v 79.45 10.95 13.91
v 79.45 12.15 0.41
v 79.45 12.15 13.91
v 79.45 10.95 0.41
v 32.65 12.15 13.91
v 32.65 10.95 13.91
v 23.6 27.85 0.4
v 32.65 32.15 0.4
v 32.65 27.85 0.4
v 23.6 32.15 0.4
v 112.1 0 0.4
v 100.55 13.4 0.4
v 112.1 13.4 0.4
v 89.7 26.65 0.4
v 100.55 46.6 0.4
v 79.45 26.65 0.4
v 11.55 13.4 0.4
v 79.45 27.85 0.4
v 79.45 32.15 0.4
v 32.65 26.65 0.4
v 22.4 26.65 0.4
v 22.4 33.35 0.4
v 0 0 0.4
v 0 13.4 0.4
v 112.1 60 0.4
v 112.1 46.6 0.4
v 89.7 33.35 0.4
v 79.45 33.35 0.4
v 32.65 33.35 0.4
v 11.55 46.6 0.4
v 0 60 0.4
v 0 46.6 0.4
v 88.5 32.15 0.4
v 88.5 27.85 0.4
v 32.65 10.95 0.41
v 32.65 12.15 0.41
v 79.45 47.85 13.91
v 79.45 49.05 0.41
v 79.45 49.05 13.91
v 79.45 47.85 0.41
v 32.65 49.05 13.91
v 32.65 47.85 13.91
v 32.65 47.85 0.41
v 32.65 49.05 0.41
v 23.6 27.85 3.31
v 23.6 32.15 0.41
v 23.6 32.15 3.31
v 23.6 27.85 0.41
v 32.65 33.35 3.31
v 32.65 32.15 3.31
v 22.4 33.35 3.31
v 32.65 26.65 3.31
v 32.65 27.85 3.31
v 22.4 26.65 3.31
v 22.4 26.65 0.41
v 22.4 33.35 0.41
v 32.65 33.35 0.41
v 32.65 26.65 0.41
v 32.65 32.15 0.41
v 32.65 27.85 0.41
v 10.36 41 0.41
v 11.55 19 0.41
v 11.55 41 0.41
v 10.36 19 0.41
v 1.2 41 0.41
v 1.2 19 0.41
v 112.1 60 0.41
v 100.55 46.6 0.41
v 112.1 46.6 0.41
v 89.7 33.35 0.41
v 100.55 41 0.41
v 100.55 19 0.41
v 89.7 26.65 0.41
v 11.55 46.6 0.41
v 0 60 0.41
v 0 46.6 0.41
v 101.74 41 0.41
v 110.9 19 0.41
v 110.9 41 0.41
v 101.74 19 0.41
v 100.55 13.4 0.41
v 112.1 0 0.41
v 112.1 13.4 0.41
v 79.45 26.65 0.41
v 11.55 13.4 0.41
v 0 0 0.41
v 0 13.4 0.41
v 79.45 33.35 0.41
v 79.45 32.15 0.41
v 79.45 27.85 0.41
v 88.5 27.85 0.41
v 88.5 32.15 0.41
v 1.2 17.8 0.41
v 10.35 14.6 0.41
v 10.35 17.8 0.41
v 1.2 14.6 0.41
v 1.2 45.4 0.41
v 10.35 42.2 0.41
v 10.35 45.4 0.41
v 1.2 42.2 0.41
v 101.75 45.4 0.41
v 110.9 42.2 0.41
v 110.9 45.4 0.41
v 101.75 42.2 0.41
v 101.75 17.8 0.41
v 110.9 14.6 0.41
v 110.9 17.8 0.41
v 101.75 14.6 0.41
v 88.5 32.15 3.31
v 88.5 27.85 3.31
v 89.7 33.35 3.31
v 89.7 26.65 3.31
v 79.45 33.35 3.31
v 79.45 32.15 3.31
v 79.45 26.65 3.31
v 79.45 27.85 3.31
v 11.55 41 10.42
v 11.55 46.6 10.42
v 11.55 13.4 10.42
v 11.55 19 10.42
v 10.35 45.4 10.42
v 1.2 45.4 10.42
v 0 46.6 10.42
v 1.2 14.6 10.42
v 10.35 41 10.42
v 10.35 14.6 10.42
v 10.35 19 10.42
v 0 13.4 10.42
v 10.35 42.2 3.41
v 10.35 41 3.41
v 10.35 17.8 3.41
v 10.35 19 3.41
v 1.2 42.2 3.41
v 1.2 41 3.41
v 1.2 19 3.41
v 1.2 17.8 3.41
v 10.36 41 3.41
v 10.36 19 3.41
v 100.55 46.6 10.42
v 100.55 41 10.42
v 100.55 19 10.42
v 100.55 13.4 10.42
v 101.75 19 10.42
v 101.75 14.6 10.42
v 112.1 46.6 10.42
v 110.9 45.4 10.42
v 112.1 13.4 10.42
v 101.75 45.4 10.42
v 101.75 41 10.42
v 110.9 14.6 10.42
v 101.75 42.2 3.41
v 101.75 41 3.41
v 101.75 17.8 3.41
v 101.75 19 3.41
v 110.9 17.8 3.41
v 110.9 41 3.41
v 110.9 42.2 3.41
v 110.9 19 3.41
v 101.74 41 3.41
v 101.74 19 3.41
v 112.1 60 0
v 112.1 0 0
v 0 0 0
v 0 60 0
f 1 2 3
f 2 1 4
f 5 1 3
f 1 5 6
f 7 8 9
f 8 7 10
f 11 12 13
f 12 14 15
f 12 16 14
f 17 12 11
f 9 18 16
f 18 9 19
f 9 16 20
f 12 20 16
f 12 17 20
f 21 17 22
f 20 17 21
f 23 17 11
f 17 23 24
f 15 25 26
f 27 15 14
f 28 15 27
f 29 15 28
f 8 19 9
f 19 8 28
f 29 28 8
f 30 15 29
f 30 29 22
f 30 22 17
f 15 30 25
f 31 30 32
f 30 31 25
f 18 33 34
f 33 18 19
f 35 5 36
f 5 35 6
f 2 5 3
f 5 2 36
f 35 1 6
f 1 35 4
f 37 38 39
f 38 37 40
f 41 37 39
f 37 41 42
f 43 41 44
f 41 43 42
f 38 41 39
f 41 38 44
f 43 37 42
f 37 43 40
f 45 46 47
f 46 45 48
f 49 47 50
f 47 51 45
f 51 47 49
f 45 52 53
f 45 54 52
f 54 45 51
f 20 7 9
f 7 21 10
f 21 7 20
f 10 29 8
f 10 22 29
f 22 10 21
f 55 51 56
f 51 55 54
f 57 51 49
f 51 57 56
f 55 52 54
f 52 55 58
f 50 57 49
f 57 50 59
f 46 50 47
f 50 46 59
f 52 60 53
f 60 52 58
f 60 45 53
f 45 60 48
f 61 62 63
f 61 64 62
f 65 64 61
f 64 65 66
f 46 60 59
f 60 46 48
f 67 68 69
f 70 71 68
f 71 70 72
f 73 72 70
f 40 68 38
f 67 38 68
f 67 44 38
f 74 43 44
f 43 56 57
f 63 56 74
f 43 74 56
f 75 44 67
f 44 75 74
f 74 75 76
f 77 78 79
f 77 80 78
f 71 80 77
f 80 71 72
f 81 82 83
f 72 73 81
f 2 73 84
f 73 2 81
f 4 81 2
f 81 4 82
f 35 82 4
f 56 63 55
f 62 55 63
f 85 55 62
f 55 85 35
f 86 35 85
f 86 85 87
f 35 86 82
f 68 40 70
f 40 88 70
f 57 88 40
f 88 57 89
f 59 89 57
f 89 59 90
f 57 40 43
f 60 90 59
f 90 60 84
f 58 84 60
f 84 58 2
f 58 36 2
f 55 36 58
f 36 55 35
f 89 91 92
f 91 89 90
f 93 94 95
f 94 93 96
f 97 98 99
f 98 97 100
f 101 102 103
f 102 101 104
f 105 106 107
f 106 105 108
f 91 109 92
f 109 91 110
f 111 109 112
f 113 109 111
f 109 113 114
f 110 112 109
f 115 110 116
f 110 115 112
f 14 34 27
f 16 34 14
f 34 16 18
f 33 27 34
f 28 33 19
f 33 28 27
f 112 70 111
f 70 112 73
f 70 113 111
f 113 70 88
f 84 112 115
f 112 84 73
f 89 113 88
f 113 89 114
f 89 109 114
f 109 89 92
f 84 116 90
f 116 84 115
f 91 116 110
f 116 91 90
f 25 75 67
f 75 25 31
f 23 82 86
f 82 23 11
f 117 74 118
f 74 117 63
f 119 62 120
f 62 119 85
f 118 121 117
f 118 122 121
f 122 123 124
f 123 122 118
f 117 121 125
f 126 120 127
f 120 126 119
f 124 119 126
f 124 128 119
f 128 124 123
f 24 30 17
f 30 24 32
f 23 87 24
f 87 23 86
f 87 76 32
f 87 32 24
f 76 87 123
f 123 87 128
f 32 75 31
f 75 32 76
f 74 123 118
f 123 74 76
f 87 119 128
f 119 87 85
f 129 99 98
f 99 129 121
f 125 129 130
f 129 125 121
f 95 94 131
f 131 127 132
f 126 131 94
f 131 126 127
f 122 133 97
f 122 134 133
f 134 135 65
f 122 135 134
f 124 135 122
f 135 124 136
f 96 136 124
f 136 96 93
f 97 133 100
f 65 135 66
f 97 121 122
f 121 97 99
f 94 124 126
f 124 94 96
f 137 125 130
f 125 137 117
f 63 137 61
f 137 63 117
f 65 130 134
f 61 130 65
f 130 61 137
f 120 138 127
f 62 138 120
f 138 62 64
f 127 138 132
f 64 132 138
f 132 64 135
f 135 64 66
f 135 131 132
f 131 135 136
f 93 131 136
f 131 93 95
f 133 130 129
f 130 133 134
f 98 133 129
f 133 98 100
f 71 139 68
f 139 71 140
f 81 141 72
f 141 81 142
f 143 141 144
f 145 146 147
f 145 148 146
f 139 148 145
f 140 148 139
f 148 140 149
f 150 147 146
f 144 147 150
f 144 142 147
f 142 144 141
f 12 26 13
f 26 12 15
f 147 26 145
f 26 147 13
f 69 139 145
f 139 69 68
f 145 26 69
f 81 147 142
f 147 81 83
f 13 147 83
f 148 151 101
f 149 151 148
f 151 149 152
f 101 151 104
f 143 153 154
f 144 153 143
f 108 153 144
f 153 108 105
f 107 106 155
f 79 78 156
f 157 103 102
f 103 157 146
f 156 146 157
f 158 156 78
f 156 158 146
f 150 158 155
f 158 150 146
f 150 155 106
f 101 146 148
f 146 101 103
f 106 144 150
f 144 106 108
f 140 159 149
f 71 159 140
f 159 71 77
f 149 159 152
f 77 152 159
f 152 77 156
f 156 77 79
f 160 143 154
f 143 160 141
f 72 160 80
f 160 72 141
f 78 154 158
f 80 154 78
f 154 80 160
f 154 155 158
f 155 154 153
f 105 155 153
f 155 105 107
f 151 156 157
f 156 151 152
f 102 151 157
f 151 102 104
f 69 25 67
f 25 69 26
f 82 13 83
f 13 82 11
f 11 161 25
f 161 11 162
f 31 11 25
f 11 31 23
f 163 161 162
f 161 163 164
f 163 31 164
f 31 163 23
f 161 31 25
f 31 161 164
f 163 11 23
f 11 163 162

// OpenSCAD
// file: ../../Base/Boxes.scad
// Fischertechnik Box Foundation
// Pre-designed Boxes

use <Constants.scad>

include <PlacementOptions.scad>

box190Width = 190;
box190Depth = 130;
box130Width = 130;
box130Depth = 95;
boxUsageHeight = 33.9;
boxWallThickness = 2.4;
boxBaseThickness = 1.0;
boxWebWidth = 3.0;

// getBoxWallThickness()
// Gets the wall thickness of a Fischertechnik Box

function getBoxWallThickness() = boxWallThickness;

// Gets the usable height of a fischertechnik box
function getBoxUsageHeight() = boxUsageHeight;

// Gets the thickness of the Fischertechnik box base.
function getBoxBaseThickness() = boxBaseThickness;

// Gets the width of a box web
function getBoxWebWidth() = boxWebWidth;

// Gets the usable inner space of a Box 190 as an x/y-list
function getBox190Space() = [
    box190Width - 2*getBoxWallThickness(), 
    box190Depth - 2*getBoxWallThickness() ];

// Imports the Fischertechnik empty box 130x190 mm and places it at position 0,0
// 190x130 are the outer sizes, the inner space is slightly smaller. Use getBox190Space() to get the inner sizes.
// This module needs the STL file "Fischertechnik Box 130x190.stl" in the library path.
// The box is positioned that the usable inner space is at the 0,0,0 position. The

module Box190() {
    translate([-getBoxWallThickness(),-getBoxWallThickness(),-getBoxBaseThickness()])
        import("Fischertechnik Box 130x190.stl", convexity=3);
}

// Gets the usable inner space of a Box 130 as an x/y-list
function getBox130Space() = [
    box130Width - 2*getBoxWallThickness(), 
    box130Depth - 2*getBoxWallThickness() ];

// Imports the Fischertechnik empty box 95x130 mm and places it at position 0,0
// 190x130 are the outer sizes, the inner space is slightly smaller. Use getBox190Space() to get the inner sizes.
// This module needs the STL file "Fischertechnik Box 95x130.stl" in the library path.
// The box is positioned that the usable inner space is at the 0,0,0 position. The

module Box130() {
    translate([-getBoxWallThickness(),-getBoxWallThickness(),-getBoxBaseThickness()])
        import("Fischertechnik Box 95x130.stl", convexity=3);
}

// Creates a web at the specified box walls
// corner 0 = LowerLeft, 1 = UpperLeft, 2 = UpperRight, 3 = LowerRight
// side 0 = LeftOfCorner, 1 = RightOfCorner
// distance = Distance in mm from the corner
// box = inner width and depth of the box (default: Box 190)
// webWidth = length of the web (default is 3 mms)
// webThickness = thickness of the web (default is 1 mm)

module BoxWeb(corner, side, distance, box=getBox190Space(), webWidth=getBoxWebWidth(), webThickness=1.0) {
    sink = getBoxWallThickness()/2;

    width = (corner % 2 == 0) ? 
            (side == LeftOfCorner ? webWidth : webThickness) :
            (side == LeftOfCorner ? webThickness : webWidth);

    depth = (corner % 2 == 0) ? 
            (side == RightOfCorner ? webWidth : webThickness) :
            (side == RightOfCorner ? webThickness : webWidth);
    
    xDiff = corner == LowerLeft ? 
                (side == LeftOfCorner ? -sink : distance) :
            (corner == UpperLeft ?                
                (side == LeftOfCorner ? distance : -sink) :
            (corner == UpperRight ?
                (side == LeftOfCorner ? box.x-webWidth+sink : box.x-distance-webThickness) :
                (side == LeftOfCorner ? box.x-distance-webThickness: box.x-webWidth+sink)));

    yDiff = corner == LowerLeft ? 
                (side == RightOfCorner ? -sink : distance) :
            (corner == UpperLeft ?
                (side == RightOfCorner ? box.y-distance : box.y-webWidth+sink) :
            (corner == UpperRight ?
                (side == RightOfCorner ? box.y-webWidth+sink : box.y-distance) :
                (side == RightOfCorner ? distance : -sink)));
    
    translate([xDiff, yDiff, -getExcess()])
        cube([width, depth, boxUsageHeight + 2*getExcess()]);
}
// file: ../../Base/Rotation.scad
// Fischertechnik Box Foundation
// Geometry Helpers Rotation

include <PlacementOptions.scad>

// getRotatedSpace(space, rotation=NoRotation)
// Rotates the space dependent on the specified rotation

function getRotatedSpace(space, rotation=NoRotation) = [
    (rotation == Rotate90 || rotation == Rotate270) ? space.y : space.x,
    (rotation == Rotate90 || rotation == Rotate270) ? space.x : space.y
];

// Rotates the given space around the fixed left lower corner
// space = the space the children needs as width/depth list [width,depth]
// rotation = 0 Rotate0 degrees, 1 Rotate90 degrees, 2 Rotate180 degrees, 3 Rotate270 degrees (equivalent to -90)

module RotateFix(space, rotation=Rotate0) {
    dy = (rotation == Rotate0 || rotation == Rotate270) ? 0 :
        (rotation == Rotate90) ? space.x :
        space.y;
    dx = (rotation < Rotate180) ? 0 :
        (rotation == Rotate180) ? space.x :
        space.y;
    
    translate([dx, dy, 0])
        rotate([0, 0, rotations[rotation]])
            children();
}
// file: ../../Base/Alignment.scad
// Fischertechnik Box Foundation
// Geometry Helpers Alignment

include <PlacementOptions.scad>

// getAlignedX(elementWidth, spaceWidth, align=AlignRight, offset=0)
// Gets the aligned X offset of an element with the given
// width in the given space.
// elementWidth = The width of the element to positon
// spaceWidth = The space where the element should be aligned
// align = 0 AlignLeft, 1 AlignCenter, 2 AlignRight
// offset = an optional offset from the aligned position. When
// aligned left or centered, then positive values are in X direction.
// When aligned right then positive values are in negative X direction.

function getAlignedX(elementWidth, spaceWidth, align=AlignRight, offset=0) =
    (align == AlignLeft) ?
        offset :
        ((align == AlignCenter) ?
        (spaceWidth - elementWidth)/2 + offset :
        spaceWidth - offset - elementWidth);

// getAlignedY(elementDepth, spaceDepth, align=AlignTop, offset=0)
// Gets the aligned Y offset of an element with the given
// depth in the given space.
// elementDepth = The depth of the element to positon
// spaceDepth = The space where the element should be aligned
// align = 0 AlignBottom, 1 AlignCenter, 2 AlignTop
// offset = an optional offset from the aligned position. When
// aligned bottom or centered, then positive values are in Y direction.
// When aligned top then positive values are in negative Y direction.

function getAlignedY(elementDepth, spaceDepth, align=AlignTop, offset=0) =
    (align == AlignBottom) ?
        offset :
        ((align == AlignCenter) ?
        (spaceDepth - elementDepth)/2 + offset :
        spaceDepth - offset - elementDepth);
// file: ../../Base/PlacementOptions.scad
// Fischertechnik Box Foundation
// Placement Options

// Alignment
NoAlign = 0;
AlignLeft = 1;
AlignBottom = 2;
AlignCenter = 3;
AlignRight = 4;
AlignTop = 5;

// Element rotation degree steps
rotations = [0, -90, -180, -270];

// Rotation
NoRotation = 0;
Rotate0 = 0;
Rotate90 = 1;
Rotate180 = 2;
Rotate270 = 3;

// Docking (seen from above)
NoDock = -1;
DockLeft = 0;
DockTop = 1;
DockRight = 2;
DockCorner = 2;
DockBottom = 3;

// Web corners
LowerLeft = 0;
UpperLeft = 1;
UpperRight = 2;
LowerRight = 3;

// Web position relative to corner
LeftOfCorner = 0;
RightOfCorner = 1;
// file: ../../Base/Placement.scad
// Fischertechnik Box Foundation
// Geometry Helpers Placement

use <Constants.scad>
use <Alignment.scad>
use <Rotation.scad>
use <Boxes.scad>

include <PlacementOptions.scad>

// Place(x=0, y=0, elementSpace=[0,0], alignX=AlignLeft, alignY=AlignBottom, rotation=Rotate0, boxSpace=getBox190Space())
// Places the child at the specified position
// y = Y-Position. This is a relative position when an X aligment is specified.
// x = X-Position. This is a relative position when an Y aligment is specified.
// elementSpace = space of the element to be placed [x,y]
// alignX = -1=NoAlign, 0 AlignLeft, 1 AlignCenter, 3 AlignRight (elementSpace and boxSpace required!)
// alignY = -1=NoAlign, 2 AlignBottom, 1 AlignCenter, 4 AlignTop (elementSpace and boxSpace required!)
// rotation = 0 Rotate0 0 degrees, 1 Rotate90 90 degrees, 
// 2 Rotate180 180 degrees, 3 Rotate270 270 degrees (equivalent to -90)
// boxSpace = Inner space of the box where the placement occurs [x,y] - default is Box 190x130 inner space

module Place(x=0, y=0, elementSpace=[0,0], 
  alignX=AlignLeft, alignY=AlignBottom, 
  rotation=NoRotation, boxSpace=getBox190Space()) {

    module Position(x, y, space, rotation=Rotate0) {
        translate([x, y, 0])
            RotateFix(space, rotation)
                children();
    }

    space = getRotatedSpace(elementSpace, rotation);
    alignedX = getAlignedX(space.x, boxSpace.x, alignX, x);
    alignedY = getAlignedY(space.y, boxSpace.y, alignY, y);
    Position(alignedX, alignedY, elementSpace, rotation)
        children();
}

// Center(space=getBox130Space(), elementSpace=[0,0])
// space = Space where the children is centered. For cylinder use centered=true and no elementSpace.
// elementSpace = space of the element to be centered [x,y]

module Center(space=getBox190Space(), elementSpace=[0,0]) {
    translate([(space.x - elementSpace.x) / 2, (space.y - elementSpace.y) / 2])
        children(0);
}

// CenterHorizontal(width=0, y=0, offset=0, space=getBox130Space())
// space = Space where the children is centered. For cylinder use centered=true and no elementSpace.
// elementSpace = space of the element to be centered [x,y]

module CenterHorizontal(width=0, y=0, offset=0, space=getBox190Space()) {
    translate([(space.x - width) / 2 + offset, y])
        children(0);
}

// CenterVertical(depth=0, x=0, offset=0, space=getBox130Space())
// space = Space where the children is centered. For cylinder use centered=true and no elementSpace.
// elementSpace = space of the element to be centered [x,y]

module CenterVertical(depth=0, x=0, offset=0, space=getBox190Space()) {
    translate([x, (space.y - depth) / 2 + offset])
        children(0);
}
// file: ../../Elements/FrameCouplingBracket.scad
// Fischertechnik Box Library
// Coupling Bracket
// 38252

use <../Base/Constants.scad>
use <../ModelBase/Simple.scad>
use <../ModelBase/Complex.scad>

width = 9.15 - getTolerance();
depth = 30;
height = 10;

// getFrameCouplingBracketSpace()
// Gets the space the frame coupling bracket needs as width and depth (.x and .y as a list)

function getFrameCouplingBracketSpace() = getFrameOuterVolume([width, depth, height]);

// FrameCouplingBracket()
// Coupling Bracket
// 38252

module FrameCouplingBracket() {
    cutOffWidth = 2 * getDividerThickness();
    cutOffDepth = 22;
    cutOffHeight = height + 2*getExcess();
    
    innerVolume = getFrameInnerVolume([width, depth, height]);
    cutOffXOffset = innerVolume.x + 2*getExcess();
    cutoffYOffset = (innerVolume.y - cutOffDepth) / 2 + getDividerThickness();
    
    difference() {
        Frame(innerVolume, tolerance=0);
        translate([cutOffXOffset, cutoffYOffset, 0])
            cube([cutOffWidth, cutOffDepth, cutOffHeight]);
    }
    
    railWidth = innerVolume.x + 2*getExcess();
    railDepth = getDividerThickness();
    railHeight = 3 + getExcess();
    
    railXOffset = getDividerThickness() - getExcess();
    railYOffset1 = cutoffYOffset - getDividerThickness();
    railYOffset2 = cutoffYOffset + cutOffDepth;
    
    translate([railXOffset, 0, -getExcess()]) {
        translate([0, railYOffset1])
            cube([railWidth, railDepth, railHeight]);
        translate([0, railYOffset2])
            cube([railWidth, railDepth, railHeight]);
    }
}

// Test
color("lightgray")
FrameCouplingBracket();
// file: ../../Elements/HolderCompleteBucket.scad
// Fischertechnik Box Library
// Complete Bucket Holder
// 37354, 37353, 37355, 38257

use <../Base/Constants.scad>
use <../ModelBase/Simple.scad>
use <../ModelBase/Complex.scad>

width = 89;
depth = 60;

// getHolderCompleteBucketSpace()
// Gets the space the holder complete bucket needs as width and depth (.x and .y as a list)

function getHolderCompleteBucketSpace() = [width, depth];

// HolderCompleteBucket()
// Holder for complete bucket with three middle and two side parts, 
// and a middle axis.
// 37354, 37353, 37355, 38257

module HolderCompleteBucket() {
    railWidth = 46.8;
    railHeight = 13.5;
    railDistance = 35.7;
    outerPinFrameLength = 10.25;
    innerPinFrameLength = outerPinFrameLength - 3*getDividerThickness();
    innerPinFrameDepth = 4.3;
    outerPinFrameDepth = innerPinFrameDepth + 2*getDividerThickness();
    pinFrameHeight = 2.9;
    
    Space(getHolderCompleteBucketSpace());

    railXOffset = (getHolderCompleteBucketSpace().x - railWidth) / 2;
    railYOffset1 = (getHolderCompleteBucketSpace().y - railDistance) / 2 - getDividerThickness();
    railYOffset2 = railYOffset1 + railDistance + getDividerThickness();    
    
    translate([railXOffset, 0, 0]) {
        translate([0, railYOffset1, 0])
            Wall([railWidth, getDividerThickness(), railHeight]);
        translate([0, railYOffset2, 0])
            Wall([railWidth, getDividerThickness(), railHeight]);
    }
    
    midYOffset = (getHolderCompleteBucketSpace().y - outerPinFrameDepth) / 2;
    
    railXOffset1 = railXOffset - outerPinFrameLength;
    translate([railXOffset1, midYOffset, 0])
        DockableFrame([innerPinFrameLength, innerPinFrameDepth, pinFrameHeight], wallRight=false, tolerance=0);
    
    railXOffset2 = outerPinFrameLength + railXOffset + railWidth;
    translate([railXOffset2, midYOffset, 0])
        mirror([1,0,0])
            DockableFrame([innerPinFrameLength, innerPinFrameDepth, pinFrameHeight], wallRight=false, tolerance=0);
}

// Test
color("lightgray")
HolderCompleteBucket();
// file: ../../Elements/AxisClip10.scad
// Fischertechnik Box Library
// Axis for clip 10
// 31023

use <../ModelBase/Simple.scad>

width = 12;
depth = 12;
height = 23;

// getAxisClip10Space()
// Gets the space of a frame for a clip 10 with spring ring (mot2)

function getAxisClip10Space() = [width, depth, height];

// AxisClip10()
// Axis for clip 10 with spring ring (mot2)

module AxisClip10() {
    LeveledAxisWithSpace(height, height-10, getAxisClip10Space());
}

// Tests
color("lightgray")
AxisClip10();
// file: ../../Base/Constants.scad
// Fischertechnik Box Foundation
// Constants

// Constant values necessary for multiple elements

// Base constants
dividerThickness = 1.2;
excess = 0.01;
fragments = 90;
tolerance = 0.8;

// Gets the thickness of a divider 
function getDividerThickness() = dividerThickness;

// Gets the excess that is used to merge walls into each other
function getExcess() = excess;

// Gets amount of fragments of a cylinder
function getFragments() = fragments;

// Gets the inner tolerance of a frame to each side
function getTolerance() = tolerance;


// Fischertechnik specific constants
axisDiameter = 4;
axisBottomDiameter = axisDiameter + 1;
standardEdgeDistance = 2.5;
standardWebDistance = 11.5;
standardCornerLength = 15;
tubeWallFactor = 0.8;

// Gets axis diameter
function getAxisDiameter() = axisDiameter;

// Gets axis bottom diameter for thicker part at the bottom
function getAxisBottomDiameter() = axisBottomDiameter;

// gets the standard distance to the wall of the box for dockable frames with webs
function getStandardEdgeDistance() = standardEdgeDistance;

// gets the standard distance of each web to the corner of the dockable frame
function getStandardWebDistance() = standardWebDistance;

// gets the standard length of the corner walls of a dockable frame
function getStandardCornerLength() = standardCornerLength;

// gets the wall thickness of a tube.
function getTubeWallThickness() = tubeWallFactor * getDividerThickness();
// file: ../../Elements/ComboCompleteBucketPlusCouplingBrackets.scad
// Fischertechnik Box Library
// Combo Complete Bucket plus Coupling Brackets
// 38252, 37354, 37353, 37355, 38257

use <../Base/Constants.scad>
use <../ModelBase/Simple.scad>
use <../ModelBase/Complex.scad>

use <HolderCompleteBucket.scad>
use <FrameCouplingBracket.scad>

// getComboCompleteBucketPlusCouplingBracketsSpace()
// Gets the space the combo complete bucket plus two coupling brackets needs as width and depth (.x and .y as a list)

function getComboCompleteBucketPlusCouplingBracketsSpace() = [
    2*getFrameCouplingBracketSpace().x + getHolderCompleteBucketSpace().x, 
    getHolderCompleteBucketSpace().y];

// ComboCompleteBucketPlusCouplingBrackets()
// Holder for complete bucket with three middle and two side parts, 
// and a middle axis plus two frame coupling brackets.
// 37354, 37353, 37355, 38257, 38252

module ComboCompleteBucketPlusCouplingBrackets() {
    Space(getComboCompleteBucketPlusCouplingBracketsSpace());
    
    translate([getFrameCouplingBracketSpace().x, 0, 0])
        HolderCompleteBucket();
    
    yOffset = (getHolderCompleteBucketSpace().y - getFrameCouplingBracketSpace().y) / 2;
    translate([0, yOffset, 0])
        FrameCouplingBracket();
    
    mirror([1, 0, 0])
        translate([-getComboCompleteBucketPlusCouplingBracketsSpace().x, yOffset, 0])
            FrameCouplingBracket();
}

// Test
color("lightgray") {
ComboCompleteBucketPlusCouplingBrackets();
}
// file: ../TestPrint.scad
// 3D Print Test Base

use <../Base/Constants.scad>

use <../Elements/AxisClip10.scad>

module TestPrint(elementSpace) {
    cube([elementSpace.x, elementSpace.y, 0.4]);
    translate([0,0,0.4+getExcess()]) {
        children();
    }
}

TestPrint(getAxisClip10Space())
    AxisClip10();
// main file
// 3D Print Test Base
// ComboCompleteBucketPlusCouplingBrackets

use <../TestPrint.scad>
use <../../Elements/ComboCompleteBucketPlusCouplingBrackets.scad>

TestPrint(getComboCompleteBucketPlusCouplingBracketsSpace())
    ComboCompleteBucketPlusCouplingBrackets();
